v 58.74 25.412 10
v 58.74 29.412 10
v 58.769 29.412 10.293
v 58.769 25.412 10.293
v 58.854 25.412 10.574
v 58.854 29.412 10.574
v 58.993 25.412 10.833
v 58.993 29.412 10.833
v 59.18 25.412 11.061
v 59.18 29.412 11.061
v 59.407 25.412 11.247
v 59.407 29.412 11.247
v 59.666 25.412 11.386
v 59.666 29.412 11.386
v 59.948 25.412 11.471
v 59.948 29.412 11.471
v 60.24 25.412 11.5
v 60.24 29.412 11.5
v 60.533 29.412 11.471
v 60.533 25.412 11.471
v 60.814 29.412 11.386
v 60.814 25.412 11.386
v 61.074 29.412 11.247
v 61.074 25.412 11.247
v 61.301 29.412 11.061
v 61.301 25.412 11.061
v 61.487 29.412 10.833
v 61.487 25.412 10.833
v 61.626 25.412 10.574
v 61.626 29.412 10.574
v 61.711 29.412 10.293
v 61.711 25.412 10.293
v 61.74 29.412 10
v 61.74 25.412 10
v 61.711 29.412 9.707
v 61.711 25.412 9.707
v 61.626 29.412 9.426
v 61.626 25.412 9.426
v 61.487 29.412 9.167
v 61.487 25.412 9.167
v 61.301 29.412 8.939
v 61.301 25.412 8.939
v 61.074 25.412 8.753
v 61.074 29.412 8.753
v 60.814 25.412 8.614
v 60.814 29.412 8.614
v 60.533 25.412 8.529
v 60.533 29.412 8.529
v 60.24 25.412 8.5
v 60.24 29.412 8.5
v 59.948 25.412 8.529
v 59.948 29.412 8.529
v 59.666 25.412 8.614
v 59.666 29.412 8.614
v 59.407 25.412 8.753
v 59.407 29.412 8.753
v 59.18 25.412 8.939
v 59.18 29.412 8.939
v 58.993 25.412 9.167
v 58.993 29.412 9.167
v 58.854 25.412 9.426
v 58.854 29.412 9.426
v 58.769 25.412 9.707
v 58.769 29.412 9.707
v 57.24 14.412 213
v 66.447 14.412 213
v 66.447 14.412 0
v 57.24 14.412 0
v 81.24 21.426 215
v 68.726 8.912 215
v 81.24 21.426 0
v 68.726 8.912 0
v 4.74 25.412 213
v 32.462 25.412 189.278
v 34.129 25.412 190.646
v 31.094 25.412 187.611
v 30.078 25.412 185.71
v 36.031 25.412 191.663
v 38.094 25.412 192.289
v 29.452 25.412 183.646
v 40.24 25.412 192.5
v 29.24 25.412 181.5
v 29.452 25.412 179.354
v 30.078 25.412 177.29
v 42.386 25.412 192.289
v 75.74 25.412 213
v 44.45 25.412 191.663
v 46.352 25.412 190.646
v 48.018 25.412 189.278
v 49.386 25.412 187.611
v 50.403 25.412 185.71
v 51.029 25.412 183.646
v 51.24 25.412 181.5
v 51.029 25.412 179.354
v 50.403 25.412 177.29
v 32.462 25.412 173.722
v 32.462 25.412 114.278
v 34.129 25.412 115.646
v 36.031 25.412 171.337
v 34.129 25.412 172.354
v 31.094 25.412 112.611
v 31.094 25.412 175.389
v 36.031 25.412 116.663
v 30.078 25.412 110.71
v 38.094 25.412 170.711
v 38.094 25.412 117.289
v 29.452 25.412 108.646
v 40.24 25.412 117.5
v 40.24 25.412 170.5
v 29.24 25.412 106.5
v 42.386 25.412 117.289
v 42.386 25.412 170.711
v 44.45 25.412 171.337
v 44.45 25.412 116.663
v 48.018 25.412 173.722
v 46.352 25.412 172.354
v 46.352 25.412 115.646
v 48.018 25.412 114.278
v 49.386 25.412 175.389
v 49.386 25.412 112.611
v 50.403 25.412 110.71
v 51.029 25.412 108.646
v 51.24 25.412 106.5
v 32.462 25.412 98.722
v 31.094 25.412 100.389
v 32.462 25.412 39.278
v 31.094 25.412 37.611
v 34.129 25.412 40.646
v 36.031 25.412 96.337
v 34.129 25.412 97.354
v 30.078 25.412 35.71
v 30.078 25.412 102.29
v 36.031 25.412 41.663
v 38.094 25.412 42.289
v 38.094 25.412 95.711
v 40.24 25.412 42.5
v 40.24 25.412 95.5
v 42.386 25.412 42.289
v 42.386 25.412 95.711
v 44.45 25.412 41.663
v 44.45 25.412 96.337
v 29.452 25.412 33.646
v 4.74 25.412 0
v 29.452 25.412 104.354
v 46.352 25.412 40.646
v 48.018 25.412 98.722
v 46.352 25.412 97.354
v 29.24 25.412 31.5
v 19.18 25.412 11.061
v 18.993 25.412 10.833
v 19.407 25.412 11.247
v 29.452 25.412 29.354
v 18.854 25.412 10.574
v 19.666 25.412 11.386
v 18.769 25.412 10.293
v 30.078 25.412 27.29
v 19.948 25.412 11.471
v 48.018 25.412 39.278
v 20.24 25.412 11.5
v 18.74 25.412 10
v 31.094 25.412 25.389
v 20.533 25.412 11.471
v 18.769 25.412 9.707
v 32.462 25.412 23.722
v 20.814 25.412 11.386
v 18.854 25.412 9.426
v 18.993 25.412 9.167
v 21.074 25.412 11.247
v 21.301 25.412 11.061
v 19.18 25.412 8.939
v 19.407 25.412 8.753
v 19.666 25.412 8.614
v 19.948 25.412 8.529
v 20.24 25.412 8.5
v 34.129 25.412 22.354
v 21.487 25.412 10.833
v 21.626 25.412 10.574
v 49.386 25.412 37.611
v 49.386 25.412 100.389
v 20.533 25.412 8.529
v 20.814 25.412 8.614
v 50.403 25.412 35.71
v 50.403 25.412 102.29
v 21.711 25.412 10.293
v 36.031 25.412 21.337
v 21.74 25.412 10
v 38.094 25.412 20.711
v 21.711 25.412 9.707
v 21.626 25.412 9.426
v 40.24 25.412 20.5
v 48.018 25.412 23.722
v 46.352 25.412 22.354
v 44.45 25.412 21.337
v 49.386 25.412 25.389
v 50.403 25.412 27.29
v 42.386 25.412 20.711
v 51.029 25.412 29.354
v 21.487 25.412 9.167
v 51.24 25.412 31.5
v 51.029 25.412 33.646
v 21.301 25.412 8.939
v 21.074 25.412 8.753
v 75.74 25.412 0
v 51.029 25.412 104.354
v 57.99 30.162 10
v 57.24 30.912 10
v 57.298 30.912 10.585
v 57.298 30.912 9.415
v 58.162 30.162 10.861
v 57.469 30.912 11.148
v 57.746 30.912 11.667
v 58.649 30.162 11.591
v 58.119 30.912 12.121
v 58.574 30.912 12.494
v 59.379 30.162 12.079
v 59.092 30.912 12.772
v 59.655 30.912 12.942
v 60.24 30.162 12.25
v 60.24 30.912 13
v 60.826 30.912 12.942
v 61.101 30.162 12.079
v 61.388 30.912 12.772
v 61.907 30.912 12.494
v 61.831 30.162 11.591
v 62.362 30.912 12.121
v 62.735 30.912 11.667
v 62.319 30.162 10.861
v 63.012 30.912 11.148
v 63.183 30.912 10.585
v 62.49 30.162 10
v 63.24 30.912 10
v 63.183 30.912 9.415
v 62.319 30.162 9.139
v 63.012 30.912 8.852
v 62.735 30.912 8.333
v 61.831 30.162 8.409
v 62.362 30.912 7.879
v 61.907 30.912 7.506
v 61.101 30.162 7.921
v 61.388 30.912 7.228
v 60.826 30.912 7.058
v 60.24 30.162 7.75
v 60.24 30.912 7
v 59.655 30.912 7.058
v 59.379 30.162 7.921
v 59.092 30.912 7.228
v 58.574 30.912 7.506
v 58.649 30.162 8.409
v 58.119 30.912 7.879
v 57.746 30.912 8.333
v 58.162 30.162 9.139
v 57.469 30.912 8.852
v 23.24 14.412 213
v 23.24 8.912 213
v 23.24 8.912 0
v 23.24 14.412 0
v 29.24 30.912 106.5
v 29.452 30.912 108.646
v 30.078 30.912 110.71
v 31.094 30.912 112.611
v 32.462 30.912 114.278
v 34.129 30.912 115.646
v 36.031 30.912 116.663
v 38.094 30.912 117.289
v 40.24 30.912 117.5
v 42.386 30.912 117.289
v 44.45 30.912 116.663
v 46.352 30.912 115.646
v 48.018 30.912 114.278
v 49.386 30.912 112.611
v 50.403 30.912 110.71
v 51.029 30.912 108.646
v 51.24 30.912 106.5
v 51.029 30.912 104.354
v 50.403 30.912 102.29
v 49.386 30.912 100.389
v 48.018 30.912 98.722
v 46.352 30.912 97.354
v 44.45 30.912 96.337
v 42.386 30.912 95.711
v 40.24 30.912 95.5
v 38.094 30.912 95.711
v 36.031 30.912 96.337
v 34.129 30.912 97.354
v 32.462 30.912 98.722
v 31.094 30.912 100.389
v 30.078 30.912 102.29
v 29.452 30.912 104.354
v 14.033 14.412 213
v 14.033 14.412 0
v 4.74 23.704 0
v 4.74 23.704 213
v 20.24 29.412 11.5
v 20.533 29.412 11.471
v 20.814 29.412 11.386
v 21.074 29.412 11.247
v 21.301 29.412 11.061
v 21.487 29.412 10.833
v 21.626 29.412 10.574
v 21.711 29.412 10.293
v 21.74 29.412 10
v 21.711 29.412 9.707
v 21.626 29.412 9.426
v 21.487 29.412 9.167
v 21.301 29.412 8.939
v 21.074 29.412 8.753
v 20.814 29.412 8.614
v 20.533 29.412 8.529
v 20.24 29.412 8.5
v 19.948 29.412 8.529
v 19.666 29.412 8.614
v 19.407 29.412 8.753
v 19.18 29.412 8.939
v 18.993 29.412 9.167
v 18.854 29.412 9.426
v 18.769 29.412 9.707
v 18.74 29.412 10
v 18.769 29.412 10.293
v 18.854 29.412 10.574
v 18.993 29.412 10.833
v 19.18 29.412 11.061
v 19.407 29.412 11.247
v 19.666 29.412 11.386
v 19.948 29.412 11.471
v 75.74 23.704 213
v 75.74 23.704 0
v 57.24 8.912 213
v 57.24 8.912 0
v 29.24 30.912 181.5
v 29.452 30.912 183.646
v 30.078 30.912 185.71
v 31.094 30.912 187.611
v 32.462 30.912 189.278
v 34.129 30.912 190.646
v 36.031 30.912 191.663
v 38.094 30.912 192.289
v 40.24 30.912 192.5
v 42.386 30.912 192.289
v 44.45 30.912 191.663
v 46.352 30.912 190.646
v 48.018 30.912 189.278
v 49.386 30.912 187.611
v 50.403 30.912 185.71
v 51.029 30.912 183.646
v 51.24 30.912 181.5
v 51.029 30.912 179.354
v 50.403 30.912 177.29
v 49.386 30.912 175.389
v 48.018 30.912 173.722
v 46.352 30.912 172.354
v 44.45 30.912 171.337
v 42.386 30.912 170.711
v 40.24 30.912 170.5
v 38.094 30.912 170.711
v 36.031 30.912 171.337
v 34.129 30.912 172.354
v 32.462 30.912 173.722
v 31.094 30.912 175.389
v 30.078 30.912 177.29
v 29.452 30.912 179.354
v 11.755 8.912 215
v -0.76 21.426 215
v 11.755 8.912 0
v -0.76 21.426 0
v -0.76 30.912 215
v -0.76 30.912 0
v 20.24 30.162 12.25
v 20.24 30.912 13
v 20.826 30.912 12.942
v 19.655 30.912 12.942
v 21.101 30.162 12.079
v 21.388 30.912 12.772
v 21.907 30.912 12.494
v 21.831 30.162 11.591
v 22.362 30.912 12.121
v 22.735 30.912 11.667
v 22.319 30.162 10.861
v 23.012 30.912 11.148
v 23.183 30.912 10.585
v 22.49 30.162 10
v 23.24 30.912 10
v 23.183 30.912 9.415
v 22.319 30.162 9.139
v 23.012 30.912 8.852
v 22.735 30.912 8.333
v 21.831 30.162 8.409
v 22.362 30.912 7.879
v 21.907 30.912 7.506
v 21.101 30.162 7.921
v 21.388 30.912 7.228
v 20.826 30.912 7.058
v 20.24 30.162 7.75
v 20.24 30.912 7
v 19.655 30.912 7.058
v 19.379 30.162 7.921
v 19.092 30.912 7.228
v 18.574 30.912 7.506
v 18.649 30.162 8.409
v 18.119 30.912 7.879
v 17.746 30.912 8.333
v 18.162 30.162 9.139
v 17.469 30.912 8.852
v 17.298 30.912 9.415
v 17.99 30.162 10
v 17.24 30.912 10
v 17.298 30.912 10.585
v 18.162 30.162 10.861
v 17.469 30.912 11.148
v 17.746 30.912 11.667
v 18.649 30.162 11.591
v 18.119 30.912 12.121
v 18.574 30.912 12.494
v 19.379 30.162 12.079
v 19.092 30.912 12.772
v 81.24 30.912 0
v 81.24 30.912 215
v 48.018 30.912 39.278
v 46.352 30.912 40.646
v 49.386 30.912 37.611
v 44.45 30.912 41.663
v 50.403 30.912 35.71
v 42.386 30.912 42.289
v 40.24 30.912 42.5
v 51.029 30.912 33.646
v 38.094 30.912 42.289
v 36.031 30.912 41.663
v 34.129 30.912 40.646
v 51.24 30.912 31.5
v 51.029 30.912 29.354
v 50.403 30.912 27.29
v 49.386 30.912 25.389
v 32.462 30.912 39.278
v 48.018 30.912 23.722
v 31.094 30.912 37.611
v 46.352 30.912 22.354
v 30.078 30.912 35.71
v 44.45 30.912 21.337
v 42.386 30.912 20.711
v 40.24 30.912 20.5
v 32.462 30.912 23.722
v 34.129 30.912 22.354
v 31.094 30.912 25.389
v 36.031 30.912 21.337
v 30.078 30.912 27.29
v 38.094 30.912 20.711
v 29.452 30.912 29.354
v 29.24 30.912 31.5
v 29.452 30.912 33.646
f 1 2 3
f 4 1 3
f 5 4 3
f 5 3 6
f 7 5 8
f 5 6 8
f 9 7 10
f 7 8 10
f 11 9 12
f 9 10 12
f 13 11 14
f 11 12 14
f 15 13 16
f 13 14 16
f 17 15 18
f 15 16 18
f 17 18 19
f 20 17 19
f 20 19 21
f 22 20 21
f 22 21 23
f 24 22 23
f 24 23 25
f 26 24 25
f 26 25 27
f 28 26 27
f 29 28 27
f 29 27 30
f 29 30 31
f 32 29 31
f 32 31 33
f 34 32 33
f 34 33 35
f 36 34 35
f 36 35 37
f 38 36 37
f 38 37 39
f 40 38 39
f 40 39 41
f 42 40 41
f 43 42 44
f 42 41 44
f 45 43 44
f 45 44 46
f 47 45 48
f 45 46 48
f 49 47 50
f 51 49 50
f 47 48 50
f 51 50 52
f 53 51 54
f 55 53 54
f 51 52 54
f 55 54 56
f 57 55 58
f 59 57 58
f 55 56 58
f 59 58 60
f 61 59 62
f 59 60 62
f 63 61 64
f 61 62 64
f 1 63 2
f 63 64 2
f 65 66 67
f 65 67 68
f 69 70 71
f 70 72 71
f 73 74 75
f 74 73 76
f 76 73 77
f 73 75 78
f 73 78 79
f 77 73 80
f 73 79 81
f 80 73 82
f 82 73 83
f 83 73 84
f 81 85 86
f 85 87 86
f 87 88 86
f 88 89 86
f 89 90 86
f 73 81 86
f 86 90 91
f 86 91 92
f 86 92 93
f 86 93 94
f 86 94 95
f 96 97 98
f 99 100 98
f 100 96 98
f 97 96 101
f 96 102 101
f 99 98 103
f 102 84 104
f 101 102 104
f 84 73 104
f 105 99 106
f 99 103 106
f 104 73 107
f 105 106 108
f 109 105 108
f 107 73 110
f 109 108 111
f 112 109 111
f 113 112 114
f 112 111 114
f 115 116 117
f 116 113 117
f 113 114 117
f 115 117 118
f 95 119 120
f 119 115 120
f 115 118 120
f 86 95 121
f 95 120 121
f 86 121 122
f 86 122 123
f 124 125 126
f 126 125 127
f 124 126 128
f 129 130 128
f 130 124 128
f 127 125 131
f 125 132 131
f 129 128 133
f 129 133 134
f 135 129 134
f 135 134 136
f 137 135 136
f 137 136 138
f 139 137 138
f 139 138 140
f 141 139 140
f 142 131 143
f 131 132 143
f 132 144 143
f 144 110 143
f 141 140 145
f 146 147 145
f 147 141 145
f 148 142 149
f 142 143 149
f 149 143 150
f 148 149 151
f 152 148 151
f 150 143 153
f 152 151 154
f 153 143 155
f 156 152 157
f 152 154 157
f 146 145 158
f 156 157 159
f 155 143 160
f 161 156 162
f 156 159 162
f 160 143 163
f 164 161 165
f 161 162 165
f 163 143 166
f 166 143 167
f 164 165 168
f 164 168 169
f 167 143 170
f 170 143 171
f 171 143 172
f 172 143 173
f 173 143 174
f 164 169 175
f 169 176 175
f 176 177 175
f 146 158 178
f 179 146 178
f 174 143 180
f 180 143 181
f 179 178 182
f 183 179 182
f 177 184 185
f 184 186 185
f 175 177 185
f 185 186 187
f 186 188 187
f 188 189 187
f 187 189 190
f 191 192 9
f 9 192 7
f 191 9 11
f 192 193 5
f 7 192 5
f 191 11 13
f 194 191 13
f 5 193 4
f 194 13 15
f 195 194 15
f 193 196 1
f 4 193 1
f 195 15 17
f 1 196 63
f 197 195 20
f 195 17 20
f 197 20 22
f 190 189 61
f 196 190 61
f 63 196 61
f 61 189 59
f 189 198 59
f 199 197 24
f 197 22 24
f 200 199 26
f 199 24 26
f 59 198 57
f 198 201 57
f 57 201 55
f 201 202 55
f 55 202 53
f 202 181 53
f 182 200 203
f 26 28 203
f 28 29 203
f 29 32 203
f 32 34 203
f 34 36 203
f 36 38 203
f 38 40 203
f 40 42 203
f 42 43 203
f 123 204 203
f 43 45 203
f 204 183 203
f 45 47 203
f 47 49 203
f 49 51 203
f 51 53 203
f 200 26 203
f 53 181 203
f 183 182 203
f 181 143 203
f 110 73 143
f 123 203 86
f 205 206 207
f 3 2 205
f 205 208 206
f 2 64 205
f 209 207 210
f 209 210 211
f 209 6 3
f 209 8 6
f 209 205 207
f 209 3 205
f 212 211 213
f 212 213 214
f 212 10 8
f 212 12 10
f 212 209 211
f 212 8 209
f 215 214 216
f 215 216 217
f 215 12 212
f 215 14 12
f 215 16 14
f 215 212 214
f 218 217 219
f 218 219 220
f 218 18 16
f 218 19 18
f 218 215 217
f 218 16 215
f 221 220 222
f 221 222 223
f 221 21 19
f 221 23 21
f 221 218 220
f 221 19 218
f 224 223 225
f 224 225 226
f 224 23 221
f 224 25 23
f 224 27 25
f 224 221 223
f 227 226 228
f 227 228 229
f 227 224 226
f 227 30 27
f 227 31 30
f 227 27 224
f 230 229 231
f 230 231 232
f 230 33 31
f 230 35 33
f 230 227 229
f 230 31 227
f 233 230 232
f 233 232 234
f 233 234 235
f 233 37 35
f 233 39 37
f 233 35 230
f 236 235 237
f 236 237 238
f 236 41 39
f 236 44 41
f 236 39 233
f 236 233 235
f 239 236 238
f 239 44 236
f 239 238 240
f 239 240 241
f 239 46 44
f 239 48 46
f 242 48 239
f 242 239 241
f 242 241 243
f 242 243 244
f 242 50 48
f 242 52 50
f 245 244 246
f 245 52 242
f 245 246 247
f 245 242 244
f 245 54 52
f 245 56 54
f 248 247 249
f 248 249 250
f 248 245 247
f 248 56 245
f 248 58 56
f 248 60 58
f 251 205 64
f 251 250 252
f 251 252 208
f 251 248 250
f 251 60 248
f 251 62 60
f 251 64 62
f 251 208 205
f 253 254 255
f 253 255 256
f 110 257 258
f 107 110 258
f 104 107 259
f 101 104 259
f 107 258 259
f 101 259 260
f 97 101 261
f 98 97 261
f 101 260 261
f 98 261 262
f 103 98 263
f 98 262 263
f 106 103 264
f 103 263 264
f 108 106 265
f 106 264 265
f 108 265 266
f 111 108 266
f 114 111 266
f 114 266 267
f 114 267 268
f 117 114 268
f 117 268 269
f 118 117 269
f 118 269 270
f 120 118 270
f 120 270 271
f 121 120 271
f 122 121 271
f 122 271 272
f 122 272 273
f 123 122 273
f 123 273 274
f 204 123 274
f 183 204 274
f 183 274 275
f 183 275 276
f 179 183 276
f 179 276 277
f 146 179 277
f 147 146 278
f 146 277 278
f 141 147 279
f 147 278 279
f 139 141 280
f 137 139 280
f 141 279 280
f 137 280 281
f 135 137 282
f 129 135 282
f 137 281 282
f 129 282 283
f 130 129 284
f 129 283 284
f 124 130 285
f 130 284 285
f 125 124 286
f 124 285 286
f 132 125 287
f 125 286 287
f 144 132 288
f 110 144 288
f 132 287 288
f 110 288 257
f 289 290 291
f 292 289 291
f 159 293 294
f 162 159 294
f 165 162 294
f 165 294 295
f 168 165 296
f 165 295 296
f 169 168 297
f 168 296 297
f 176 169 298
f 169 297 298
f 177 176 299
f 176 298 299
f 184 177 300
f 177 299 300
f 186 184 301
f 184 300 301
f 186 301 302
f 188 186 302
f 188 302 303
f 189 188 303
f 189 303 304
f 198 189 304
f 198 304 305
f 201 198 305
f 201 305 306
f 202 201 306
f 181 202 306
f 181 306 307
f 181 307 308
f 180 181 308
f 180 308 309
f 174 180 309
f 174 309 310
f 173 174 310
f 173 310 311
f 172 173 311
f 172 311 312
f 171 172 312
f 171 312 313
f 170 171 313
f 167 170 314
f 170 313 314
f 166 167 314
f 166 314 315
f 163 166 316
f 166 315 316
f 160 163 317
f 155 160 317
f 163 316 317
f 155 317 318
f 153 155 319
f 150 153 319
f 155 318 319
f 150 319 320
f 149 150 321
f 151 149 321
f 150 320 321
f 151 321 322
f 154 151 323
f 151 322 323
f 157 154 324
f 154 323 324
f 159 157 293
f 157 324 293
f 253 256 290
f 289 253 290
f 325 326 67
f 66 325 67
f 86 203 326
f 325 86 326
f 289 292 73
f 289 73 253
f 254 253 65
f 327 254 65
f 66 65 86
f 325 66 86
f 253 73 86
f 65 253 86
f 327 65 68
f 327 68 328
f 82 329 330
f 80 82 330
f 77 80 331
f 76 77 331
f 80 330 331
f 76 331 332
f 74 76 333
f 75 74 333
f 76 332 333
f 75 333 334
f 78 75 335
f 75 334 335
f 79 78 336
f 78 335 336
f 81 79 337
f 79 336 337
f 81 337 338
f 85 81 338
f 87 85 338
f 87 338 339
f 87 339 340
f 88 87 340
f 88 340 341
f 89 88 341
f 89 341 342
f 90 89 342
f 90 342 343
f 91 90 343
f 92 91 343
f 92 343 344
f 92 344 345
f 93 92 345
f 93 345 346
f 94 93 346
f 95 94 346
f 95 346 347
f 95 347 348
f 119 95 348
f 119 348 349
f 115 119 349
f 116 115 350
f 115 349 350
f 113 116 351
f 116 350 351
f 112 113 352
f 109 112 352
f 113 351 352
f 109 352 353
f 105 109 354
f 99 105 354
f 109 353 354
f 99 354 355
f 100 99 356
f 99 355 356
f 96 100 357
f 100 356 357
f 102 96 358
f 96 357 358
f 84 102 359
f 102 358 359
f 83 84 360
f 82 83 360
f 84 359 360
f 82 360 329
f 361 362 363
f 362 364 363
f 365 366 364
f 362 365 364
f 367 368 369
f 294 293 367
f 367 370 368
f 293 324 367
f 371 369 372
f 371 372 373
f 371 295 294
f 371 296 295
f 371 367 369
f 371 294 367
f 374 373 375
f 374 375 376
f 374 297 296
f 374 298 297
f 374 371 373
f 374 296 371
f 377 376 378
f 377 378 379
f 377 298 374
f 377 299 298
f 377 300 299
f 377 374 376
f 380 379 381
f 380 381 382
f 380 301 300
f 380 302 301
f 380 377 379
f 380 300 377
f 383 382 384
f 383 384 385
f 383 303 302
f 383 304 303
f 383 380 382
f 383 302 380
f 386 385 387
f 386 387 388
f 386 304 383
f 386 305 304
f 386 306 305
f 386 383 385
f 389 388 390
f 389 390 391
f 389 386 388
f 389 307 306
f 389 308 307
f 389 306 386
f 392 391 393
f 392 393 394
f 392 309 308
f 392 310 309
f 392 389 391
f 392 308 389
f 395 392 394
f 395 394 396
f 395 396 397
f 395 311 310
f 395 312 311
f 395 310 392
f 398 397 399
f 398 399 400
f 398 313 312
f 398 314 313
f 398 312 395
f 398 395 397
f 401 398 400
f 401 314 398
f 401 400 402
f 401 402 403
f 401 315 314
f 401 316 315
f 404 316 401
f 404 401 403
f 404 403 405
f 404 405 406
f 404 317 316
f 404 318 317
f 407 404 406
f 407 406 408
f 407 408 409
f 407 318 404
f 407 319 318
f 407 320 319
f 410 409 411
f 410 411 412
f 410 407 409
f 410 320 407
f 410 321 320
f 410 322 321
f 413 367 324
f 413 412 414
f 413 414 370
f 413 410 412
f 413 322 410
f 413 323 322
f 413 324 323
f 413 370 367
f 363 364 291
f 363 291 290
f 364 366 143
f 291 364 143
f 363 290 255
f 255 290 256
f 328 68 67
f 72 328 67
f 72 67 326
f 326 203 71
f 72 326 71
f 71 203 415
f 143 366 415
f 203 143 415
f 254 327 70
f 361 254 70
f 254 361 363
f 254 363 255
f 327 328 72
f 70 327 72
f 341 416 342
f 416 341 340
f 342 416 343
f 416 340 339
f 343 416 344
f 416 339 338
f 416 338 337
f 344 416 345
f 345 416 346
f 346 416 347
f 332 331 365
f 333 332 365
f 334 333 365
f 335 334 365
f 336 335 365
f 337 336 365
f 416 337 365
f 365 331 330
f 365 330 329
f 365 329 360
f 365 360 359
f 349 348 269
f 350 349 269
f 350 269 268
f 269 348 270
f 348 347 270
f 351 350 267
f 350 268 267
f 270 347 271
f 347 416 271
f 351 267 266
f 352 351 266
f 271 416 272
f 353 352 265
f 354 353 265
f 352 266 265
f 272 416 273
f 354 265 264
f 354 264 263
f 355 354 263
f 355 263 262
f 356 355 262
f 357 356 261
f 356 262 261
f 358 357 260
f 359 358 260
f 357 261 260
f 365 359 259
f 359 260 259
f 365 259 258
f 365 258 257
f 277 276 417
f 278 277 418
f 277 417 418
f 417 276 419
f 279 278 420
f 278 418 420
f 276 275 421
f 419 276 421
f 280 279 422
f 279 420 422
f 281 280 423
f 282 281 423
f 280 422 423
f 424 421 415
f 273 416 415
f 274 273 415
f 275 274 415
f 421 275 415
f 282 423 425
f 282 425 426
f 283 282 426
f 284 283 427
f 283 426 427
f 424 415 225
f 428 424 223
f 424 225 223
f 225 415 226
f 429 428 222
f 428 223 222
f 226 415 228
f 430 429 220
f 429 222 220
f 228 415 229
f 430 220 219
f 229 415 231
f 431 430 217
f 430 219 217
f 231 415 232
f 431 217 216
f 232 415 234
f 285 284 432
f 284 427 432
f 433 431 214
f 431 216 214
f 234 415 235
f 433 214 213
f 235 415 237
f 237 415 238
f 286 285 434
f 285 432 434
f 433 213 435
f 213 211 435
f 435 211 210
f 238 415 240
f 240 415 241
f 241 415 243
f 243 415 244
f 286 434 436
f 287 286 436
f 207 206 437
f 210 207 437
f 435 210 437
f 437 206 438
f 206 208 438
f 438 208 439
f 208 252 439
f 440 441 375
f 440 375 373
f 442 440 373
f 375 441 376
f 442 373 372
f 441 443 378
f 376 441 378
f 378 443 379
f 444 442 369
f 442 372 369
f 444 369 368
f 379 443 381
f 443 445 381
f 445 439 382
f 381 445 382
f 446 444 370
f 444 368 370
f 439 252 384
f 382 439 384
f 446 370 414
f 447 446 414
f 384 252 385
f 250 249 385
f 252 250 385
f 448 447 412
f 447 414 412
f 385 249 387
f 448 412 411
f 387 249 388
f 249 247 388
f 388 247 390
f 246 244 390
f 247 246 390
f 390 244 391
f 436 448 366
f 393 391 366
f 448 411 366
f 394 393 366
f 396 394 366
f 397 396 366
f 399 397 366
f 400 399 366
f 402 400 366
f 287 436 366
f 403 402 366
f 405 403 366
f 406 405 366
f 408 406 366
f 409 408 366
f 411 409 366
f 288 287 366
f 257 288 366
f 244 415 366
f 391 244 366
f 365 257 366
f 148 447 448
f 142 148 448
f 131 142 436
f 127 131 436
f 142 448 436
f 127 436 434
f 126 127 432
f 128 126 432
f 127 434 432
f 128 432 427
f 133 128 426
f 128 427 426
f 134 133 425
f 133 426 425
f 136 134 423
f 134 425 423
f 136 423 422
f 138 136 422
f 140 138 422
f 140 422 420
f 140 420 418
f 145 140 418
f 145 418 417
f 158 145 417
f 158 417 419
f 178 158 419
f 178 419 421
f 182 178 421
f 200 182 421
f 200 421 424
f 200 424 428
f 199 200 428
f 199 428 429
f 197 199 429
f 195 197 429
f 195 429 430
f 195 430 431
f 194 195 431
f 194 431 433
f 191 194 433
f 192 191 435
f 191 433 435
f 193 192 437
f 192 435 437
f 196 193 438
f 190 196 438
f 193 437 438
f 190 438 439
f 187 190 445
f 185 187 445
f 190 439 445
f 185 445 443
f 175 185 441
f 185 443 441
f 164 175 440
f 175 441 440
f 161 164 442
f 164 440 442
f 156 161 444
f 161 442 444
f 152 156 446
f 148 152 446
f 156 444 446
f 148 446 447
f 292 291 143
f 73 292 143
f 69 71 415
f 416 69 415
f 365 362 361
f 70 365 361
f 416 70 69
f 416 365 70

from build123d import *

# Parameters (mm, degrees)
BOSS_EXTRUDE2_DEPTH = 213
BOSS_EXTRUDE4_DEPTH = 2
SKETCH4_R           = 1.5
CUT_EXTRUDE1_DEPTH  = 10
CHAMFER2_SIZE       = 1.5
SKETCH5_R           = 11
CUT_EXTRUDE2_DEPTH  = 52


with BuildPart() as part:
    # Sketch1 → Boss-Extrude2 (new body)
    with BuildSketch(Plane.XY):
        Polygon((23.240231027, 8.911538462), (23.240231027, 14.411538462), (14.033124245, 14.411538462), (4.740231027, 23.70443168), (4.740231027, 25.411538462), (75.740231027, 25.411538462), (75.740231027, 23.70443168), (66.447337808, 14.411538462), (57.240231027, 14.411538462), (57.240231027, 8.911538462), (68.725512401, 8.911538462), (81.240231027, 21.426257087), (81.240231027, 30.911538462), (-0.759768973, 30.911538462), (-0.759768973, 21.426257087), (11.754949652, 8.911538462), align=None)
    extrude(amount=BOSS_EXTRUDE2_DEPTH)

    # Sketch3 → Boss-Extrude4 (add)
    with BuildSketch(Plane.XY.offset(213)):
        Polygon((-0.759768973, 30.911538462), (-0.759768973, 21.426257087), (11.754949652, 8.911538462), (23.240231027, 8.911538462), (57.240231027, 8.911538462), (68.725512401, 8.911538462), (81.240231027, 21.426257087), (81.240231027, 30.911538462), align=None)
    extrude(amount=BOSS_EXTRUDE4_DEPTH)

    # Sketch4 → Cut-Extrude1 (cut)
    with BuildSketch(Plane(origin=(0, 30.911538462, 0), x_dir=(1, 0, 0), z_dir=(0, 1, 0))):
        with Locations(Location((60.240231027, -10, 0), (0, 0, 180))):
            Circle(SKETCH4_R)
        with Locations(Location((20.240231027, -10, 0), (0, 0, 270))):
            Circle(SKETCH4_R)
    extrude(amount=-CUT_EXTRUDE1_DEPTH, mode=Mode.SUBTRACT)

    # Chamfer2
    chamfer2_edges = [part.edges().sort_by_distance(p)[0] for p in [
        (61.740231027, 30.911538462, 10),
        (20.240231027, 30.911538462, 8.5),
    ]]
    chamfer(chamfer2_edges, length=CHAMFER2_SIZE)

    # Sketch5 → Cut-Extrude2 (cut)
    with BuildSketch(Plane(origin=(0, 30.911538462, 0), x_dir=(1, 0, 0), z_dir=(0, 1, 0))):
        with Locations(Location((40.240231027, -31.5, 0), (0, 0, 180))):
            Circle(SKETCH5_R)
        with Locations(Location((40.240231027, -106.5, 0), (0, 0, 180))):
            Circle(SKETCH5_R)
        with Locations(Location((40.240231027, -181.5, 0), (0, 0, 180))):
            Circle(SKETCH5_R)
    extrude(amount=-CUT_EXTRUDE2_DEPTH, mode=Mode.SUBTRACT)


solid = part.part
